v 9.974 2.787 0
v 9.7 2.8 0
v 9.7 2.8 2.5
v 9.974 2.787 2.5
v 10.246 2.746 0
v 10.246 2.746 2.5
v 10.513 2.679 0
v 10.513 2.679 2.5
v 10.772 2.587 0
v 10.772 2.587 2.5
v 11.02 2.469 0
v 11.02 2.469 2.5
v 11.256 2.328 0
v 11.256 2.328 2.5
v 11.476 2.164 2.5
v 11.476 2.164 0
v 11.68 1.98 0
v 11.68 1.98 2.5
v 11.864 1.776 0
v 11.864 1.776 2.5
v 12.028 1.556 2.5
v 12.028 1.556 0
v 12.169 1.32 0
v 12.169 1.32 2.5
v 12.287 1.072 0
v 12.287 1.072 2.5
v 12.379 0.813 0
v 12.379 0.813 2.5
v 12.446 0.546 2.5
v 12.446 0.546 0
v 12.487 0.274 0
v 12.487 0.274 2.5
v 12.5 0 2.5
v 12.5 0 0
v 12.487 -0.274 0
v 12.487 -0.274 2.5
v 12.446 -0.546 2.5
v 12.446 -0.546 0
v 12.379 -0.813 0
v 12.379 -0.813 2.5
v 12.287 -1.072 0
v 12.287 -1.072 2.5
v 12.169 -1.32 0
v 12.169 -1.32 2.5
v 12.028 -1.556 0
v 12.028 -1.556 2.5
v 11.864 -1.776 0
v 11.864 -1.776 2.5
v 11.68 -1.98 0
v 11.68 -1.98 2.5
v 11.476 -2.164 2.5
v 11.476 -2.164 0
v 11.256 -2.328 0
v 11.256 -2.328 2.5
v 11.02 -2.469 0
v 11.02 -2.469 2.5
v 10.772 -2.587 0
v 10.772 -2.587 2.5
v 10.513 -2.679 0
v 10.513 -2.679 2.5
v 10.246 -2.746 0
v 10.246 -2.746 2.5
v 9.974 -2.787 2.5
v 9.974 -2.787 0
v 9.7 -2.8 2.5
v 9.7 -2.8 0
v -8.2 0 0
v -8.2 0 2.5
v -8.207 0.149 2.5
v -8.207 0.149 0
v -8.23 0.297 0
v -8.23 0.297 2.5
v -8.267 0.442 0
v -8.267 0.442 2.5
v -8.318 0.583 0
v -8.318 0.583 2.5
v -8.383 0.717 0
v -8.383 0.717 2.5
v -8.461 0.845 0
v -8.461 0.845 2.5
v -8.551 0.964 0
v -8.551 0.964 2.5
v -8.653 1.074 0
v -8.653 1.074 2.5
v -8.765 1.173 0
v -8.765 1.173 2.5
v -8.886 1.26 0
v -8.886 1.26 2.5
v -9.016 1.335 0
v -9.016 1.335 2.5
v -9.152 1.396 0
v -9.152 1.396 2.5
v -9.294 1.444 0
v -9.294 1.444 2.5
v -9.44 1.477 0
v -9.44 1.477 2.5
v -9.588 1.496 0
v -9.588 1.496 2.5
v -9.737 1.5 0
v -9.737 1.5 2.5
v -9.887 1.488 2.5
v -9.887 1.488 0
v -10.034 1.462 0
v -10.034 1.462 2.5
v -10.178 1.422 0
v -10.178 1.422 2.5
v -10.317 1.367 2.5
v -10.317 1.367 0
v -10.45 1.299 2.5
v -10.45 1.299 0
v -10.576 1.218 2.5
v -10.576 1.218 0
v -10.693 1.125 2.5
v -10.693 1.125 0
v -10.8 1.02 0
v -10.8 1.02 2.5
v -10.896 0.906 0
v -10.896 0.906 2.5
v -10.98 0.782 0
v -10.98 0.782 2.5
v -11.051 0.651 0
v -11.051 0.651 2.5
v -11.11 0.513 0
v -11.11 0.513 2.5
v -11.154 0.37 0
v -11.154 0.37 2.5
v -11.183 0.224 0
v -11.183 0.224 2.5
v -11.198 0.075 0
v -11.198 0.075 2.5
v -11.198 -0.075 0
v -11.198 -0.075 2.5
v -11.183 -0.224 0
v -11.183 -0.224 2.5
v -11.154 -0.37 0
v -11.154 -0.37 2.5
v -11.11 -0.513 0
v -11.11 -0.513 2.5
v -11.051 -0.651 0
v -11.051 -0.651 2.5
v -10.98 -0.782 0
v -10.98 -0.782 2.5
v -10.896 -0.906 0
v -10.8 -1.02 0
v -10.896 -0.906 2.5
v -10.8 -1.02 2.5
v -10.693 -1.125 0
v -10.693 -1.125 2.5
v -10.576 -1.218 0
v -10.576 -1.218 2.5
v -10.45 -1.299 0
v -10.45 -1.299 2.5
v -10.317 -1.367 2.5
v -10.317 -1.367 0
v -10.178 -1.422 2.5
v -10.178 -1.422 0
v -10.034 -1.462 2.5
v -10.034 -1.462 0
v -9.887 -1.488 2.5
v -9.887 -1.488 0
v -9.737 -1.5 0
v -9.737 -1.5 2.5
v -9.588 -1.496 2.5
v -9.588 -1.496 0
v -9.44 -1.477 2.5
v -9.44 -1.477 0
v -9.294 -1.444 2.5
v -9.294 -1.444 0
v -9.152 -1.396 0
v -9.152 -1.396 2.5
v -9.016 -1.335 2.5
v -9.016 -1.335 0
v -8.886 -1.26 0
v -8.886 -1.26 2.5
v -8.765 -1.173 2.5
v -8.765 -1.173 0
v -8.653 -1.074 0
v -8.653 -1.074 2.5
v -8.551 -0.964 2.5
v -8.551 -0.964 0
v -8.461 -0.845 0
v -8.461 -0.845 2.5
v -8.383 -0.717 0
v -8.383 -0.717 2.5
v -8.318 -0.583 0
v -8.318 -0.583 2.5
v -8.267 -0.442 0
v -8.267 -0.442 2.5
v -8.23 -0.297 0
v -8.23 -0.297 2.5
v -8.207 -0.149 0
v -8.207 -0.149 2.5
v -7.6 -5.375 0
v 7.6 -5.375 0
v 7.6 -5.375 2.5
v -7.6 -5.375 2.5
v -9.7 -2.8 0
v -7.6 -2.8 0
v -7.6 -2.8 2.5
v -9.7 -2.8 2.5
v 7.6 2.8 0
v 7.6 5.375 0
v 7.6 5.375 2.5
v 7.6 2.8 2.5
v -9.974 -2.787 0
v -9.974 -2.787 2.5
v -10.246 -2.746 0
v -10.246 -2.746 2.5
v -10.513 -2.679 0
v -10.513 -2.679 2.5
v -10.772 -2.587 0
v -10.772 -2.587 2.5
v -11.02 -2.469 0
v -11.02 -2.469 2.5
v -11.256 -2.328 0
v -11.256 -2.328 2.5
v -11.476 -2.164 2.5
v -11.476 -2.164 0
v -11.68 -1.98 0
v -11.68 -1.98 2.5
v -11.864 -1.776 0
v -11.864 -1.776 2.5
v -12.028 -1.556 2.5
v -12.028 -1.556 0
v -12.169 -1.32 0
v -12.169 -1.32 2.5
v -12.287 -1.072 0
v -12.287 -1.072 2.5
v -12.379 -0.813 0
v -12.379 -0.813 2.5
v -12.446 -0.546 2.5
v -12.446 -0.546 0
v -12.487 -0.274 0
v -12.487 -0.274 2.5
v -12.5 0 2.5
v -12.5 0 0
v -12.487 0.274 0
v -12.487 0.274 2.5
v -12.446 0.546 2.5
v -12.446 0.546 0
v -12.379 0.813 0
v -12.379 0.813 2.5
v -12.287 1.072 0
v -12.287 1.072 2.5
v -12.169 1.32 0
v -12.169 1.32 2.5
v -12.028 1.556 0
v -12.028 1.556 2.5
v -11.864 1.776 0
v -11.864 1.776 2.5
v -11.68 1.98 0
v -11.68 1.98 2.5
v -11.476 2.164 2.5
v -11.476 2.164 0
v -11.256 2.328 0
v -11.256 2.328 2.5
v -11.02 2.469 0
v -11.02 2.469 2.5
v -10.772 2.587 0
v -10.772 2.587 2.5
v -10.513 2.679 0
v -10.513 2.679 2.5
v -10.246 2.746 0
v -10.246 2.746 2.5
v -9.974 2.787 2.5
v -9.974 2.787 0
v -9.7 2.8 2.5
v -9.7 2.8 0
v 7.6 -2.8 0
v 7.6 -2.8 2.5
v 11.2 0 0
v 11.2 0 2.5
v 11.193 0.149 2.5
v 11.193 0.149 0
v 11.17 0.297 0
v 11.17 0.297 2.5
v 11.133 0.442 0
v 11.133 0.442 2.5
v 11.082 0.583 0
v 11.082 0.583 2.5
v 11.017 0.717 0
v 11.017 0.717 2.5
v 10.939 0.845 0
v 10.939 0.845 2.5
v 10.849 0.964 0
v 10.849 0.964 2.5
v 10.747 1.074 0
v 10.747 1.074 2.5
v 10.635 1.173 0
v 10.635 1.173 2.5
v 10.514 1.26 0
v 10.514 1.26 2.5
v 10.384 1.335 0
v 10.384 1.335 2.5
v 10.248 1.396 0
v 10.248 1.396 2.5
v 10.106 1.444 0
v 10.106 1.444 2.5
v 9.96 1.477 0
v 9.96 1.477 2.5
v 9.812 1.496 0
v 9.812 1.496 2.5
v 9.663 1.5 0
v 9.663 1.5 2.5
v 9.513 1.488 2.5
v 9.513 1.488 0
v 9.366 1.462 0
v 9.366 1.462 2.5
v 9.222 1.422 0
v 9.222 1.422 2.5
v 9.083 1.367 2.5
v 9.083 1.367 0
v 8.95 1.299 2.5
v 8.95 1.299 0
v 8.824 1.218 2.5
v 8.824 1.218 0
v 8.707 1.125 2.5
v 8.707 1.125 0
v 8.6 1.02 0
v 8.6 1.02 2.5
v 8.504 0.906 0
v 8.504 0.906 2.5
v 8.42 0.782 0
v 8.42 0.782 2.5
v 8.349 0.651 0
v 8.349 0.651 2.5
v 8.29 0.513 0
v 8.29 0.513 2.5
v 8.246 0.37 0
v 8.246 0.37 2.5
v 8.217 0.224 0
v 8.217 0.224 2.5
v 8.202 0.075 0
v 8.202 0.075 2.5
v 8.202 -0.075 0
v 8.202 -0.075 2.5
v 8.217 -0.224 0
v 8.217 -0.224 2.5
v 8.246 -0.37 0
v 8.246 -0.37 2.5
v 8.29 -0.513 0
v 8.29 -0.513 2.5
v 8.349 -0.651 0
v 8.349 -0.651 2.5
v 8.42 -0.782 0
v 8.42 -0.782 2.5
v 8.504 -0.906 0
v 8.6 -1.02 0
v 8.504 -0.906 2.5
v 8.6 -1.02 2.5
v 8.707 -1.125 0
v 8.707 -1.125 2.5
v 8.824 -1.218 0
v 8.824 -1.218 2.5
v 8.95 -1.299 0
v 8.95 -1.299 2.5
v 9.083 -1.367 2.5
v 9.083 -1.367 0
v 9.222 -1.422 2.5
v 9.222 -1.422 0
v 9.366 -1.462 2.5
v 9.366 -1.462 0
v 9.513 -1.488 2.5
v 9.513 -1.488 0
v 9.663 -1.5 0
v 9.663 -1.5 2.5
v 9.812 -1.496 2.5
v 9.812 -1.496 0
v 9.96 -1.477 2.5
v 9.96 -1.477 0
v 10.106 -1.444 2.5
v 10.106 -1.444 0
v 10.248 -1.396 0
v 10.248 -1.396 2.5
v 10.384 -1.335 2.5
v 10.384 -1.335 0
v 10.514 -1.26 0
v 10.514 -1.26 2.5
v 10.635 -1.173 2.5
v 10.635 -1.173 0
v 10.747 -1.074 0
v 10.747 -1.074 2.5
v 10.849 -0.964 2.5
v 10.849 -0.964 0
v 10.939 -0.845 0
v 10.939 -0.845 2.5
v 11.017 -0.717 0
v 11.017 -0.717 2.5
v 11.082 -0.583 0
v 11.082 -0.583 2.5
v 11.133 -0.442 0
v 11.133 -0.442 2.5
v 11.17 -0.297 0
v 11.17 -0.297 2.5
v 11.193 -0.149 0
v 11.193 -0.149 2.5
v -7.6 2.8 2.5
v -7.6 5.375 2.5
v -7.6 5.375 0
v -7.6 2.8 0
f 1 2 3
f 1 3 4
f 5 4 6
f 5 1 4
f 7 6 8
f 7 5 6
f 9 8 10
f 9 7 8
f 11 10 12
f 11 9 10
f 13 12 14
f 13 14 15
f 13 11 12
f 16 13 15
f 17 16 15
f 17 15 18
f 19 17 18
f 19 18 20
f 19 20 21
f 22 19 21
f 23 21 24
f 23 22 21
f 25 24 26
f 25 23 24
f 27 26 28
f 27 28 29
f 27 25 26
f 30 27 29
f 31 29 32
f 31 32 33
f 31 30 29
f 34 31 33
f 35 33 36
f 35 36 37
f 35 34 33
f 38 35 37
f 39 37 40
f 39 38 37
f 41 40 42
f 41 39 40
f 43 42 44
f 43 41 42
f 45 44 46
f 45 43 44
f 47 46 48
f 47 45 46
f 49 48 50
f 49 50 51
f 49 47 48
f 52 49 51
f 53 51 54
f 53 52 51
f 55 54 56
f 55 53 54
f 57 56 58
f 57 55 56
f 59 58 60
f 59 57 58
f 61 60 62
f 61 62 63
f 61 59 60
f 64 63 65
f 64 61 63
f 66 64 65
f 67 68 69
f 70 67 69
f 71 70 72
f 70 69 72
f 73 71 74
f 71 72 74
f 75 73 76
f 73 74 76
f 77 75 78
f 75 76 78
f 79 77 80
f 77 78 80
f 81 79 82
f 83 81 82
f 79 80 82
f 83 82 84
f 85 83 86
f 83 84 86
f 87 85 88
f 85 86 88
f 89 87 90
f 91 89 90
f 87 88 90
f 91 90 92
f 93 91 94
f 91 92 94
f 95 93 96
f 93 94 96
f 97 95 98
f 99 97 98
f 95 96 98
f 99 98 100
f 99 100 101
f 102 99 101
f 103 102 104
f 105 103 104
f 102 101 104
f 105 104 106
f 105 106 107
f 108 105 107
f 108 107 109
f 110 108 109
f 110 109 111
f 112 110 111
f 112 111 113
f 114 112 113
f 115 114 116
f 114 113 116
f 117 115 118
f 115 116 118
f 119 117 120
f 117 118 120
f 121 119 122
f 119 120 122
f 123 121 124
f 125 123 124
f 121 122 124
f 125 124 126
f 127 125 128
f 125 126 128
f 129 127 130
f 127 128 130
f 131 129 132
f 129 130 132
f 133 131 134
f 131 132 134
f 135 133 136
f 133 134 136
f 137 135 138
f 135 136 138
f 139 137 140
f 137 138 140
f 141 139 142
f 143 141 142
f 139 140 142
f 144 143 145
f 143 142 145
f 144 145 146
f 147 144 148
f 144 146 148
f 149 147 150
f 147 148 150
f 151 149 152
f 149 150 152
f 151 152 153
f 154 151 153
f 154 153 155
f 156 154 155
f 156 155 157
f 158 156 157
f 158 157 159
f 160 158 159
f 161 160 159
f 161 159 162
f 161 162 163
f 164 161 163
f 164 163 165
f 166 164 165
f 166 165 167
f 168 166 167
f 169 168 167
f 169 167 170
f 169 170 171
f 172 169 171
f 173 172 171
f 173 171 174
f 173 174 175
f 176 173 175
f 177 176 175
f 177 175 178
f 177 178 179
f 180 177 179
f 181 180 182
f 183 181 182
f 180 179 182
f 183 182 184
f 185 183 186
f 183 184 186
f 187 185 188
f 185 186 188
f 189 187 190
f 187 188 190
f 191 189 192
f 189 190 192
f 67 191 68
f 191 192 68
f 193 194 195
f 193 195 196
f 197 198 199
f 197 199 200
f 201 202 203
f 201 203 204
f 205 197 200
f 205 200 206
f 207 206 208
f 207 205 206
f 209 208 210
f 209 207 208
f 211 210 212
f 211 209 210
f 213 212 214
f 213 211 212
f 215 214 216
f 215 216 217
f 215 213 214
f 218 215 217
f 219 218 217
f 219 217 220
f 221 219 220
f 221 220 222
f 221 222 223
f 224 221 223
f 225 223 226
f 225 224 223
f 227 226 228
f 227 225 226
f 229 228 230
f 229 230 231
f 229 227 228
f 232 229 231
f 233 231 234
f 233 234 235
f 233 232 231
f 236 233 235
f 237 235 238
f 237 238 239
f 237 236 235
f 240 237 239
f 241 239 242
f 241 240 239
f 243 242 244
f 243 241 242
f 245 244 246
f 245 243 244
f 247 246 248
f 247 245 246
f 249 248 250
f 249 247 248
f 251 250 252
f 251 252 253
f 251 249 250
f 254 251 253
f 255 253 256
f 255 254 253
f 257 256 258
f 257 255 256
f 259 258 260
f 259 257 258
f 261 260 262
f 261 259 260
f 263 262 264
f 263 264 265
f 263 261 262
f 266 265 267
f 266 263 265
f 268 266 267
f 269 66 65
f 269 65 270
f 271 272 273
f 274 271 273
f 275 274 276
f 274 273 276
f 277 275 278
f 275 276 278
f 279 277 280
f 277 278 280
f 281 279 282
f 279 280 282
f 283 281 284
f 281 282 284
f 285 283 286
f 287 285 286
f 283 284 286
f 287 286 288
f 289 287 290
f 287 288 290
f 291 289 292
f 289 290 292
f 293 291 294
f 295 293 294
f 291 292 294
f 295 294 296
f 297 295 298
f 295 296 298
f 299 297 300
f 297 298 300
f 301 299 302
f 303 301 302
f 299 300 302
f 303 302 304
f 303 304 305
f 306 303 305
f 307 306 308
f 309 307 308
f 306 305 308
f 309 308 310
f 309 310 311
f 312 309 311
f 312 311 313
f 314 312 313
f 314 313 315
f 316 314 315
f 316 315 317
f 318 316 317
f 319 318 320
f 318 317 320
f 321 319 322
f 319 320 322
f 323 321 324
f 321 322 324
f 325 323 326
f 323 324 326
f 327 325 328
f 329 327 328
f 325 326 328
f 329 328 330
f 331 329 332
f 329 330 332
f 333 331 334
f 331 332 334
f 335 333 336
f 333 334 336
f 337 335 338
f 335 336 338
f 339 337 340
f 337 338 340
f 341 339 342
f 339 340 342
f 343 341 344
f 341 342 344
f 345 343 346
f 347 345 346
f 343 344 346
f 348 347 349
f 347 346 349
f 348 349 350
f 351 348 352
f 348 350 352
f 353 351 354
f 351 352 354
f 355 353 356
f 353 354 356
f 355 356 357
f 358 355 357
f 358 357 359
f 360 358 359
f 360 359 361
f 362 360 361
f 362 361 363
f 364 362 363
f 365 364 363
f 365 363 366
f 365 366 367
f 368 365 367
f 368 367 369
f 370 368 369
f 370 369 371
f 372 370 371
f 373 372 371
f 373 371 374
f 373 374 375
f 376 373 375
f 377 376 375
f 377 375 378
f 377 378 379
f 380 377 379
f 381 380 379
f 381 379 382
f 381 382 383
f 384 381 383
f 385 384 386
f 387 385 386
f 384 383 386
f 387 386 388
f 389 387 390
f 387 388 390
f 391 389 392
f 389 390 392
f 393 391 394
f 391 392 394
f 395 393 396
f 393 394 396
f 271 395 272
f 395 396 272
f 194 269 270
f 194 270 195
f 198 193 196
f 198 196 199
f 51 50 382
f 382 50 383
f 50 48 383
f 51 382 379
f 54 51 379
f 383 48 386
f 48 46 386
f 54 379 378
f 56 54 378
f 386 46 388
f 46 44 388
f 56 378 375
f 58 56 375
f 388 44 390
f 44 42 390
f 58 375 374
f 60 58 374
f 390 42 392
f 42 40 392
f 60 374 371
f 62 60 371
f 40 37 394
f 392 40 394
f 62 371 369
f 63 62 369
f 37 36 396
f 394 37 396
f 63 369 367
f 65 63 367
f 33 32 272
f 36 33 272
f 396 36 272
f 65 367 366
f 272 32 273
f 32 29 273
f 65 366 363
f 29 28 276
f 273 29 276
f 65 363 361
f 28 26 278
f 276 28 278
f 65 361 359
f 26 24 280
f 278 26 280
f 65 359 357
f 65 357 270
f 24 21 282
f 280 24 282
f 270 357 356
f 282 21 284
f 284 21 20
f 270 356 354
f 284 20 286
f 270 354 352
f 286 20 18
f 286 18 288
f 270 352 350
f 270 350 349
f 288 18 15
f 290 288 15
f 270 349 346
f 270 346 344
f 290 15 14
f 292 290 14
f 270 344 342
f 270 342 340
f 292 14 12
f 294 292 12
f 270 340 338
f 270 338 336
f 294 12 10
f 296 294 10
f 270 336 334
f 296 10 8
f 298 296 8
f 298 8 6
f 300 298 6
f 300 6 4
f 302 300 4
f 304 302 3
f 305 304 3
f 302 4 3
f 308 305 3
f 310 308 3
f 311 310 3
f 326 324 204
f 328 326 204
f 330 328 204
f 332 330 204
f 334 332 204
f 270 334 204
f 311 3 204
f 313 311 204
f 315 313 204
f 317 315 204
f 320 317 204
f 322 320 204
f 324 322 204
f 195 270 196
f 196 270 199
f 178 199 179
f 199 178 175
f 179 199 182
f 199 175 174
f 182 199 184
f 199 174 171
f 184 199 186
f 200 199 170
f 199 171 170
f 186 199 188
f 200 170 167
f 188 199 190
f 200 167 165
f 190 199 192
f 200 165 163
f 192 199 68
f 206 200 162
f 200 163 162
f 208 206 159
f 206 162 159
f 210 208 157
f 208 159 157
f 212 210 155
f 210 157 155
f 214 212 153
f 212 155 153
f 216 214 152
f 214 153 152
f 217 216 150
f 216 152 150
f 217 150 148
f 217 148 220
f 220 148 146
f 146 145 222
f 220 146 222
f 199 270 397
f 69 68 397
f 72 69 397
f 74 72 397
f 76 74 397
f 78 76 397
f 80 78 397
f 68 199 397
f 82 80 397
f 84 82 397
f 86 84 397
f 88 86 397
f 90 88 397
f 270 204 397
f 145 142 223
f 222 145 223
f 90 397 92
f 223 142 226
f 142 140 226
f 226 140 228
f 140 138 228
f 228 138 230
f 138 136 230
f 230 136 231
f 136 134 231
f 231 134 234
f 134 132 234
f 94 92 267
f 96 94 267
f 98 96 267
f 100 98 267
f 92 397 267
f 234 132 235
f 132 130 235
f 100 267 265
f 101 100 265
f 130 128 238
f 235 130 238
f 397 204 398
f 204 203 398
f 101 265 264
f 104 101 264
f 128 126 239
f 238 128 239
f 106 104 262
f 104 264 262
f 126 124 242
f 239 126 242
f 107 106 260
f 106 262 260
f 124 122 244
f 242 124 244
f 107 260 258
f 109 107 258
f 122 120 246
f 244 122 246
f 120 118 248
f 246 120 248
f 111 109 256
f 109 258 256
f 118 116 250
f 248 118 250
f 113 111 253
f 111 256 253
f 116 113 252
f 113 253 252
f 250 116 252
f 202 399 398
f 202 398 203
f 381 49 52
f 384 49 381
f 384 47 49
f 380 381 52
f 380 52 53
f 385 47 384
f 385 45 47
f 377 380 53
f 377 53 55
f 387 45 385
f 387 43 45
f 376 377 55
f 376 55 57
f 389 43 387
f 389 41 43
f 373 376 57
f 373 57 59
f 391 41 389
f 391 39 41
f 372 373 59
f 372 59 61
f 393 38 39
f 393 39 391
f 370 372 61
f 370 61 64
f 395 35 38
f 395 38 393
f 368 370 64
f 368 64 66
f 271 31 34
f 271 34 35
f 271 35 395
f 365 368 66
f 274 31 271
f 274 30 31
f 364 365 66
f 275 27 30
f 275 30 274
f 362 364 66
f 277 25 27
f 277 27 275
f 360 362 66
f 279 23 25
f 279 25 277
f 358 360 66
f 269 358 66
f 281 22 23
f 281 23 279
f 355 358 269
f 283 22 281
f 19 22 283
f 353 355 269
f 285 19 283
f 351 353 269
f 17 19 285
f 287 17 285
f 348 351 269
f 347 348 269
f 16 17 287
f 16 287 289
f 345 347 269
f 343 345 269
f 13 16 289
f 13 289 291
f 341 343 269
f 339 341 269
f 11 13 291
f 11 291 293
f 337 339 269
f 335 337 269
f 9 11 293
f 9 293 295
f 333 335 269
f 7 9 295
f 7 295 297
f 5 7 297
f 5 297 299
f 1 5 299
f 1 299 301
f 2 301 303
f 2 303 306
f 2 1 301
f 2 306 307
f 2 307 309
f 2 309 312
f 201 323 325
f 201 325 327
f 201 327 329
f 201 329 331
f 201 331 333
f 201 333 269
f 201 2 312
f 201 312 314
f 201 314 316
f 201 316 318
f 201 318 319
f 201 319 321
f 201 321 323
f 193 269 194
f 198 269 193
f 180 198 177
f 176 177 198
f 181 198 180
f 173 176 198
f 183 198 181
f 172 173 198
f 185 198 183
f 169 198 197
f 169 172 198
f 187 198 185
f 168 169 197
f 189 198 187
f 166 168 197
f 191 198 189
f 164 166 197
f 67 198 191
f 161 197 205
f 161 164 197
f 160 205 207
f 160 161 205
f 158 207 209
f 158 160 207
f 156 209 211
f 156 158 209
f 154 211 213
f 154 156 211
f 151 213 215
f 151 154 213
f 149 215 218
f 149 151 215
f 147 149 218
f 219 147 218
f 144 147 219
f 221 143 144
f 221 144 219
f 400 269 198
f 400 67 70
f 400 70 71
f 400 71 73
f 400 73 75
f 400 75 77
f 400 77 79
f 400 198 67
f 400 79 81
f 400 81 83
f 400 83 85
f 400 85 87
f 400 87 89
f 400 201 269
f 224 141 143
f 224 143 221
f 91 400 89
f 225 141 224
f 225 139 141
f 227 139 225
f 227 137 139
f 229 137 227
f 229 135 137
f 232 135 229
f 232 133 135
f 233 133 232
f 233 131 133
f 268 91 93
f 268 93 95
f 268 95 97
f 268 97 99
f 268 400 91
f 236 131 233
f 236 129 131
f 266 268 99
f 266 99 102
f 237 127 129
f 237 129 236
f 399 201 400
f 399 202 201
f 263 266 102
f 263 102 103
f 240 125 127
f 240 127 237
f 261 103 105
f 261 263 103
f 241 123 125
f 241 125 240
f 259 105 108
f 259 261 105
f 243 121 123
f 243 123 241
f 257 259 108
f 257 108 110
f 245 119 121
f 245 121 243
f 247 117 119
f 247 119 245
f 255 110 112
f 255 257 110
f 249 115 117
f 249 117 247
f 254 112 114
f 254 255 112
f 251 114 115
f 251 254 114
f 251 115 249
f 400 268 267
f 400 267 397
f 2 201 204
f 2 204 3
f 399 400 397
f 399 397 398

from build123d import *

# Parameters (mm, degrees)
BOSS_EXTRUDE1_DEPTH = 2.5
SKETCH2_R           = 1.5
CUT_EXTRUDE1_DEPTH  = 2.5


with BuildPart() as part:
    # Sketch1 → Boss-Extrude1 (new body)
    with BuildSketch(Plane.XY):
        with BuildLine():
            Line((7.6, -2.8), (7.6, -5.375))
            Line((7.6, -5.375), (-7.6, -5.375))
            Line((-7.6, -5.375), (-7.6, -2.8))
            Line((-7.6, -2.8), (-9.7, -2.8))
            ThreePointArc((-9.7, -2.8), (-12.5, 0), (-9.7, 2.8))
            Line((-9.7, 2.8), (-7.6, 2.8))
            Line((-7.6, 2.8), (-7.6, 5.375))
            Line((-7.6, 5.375), (7.6, 5.375))
            Line((7.6, 5.375), (7.6, 2.8))
            Line((7.6, 2.8), (9.7, 2.8))
            ThreePointArc((9.7, 2.8), (12.5, 0), (9.7, -2.8))
            Line((9.7, -2.8), (7.6, -2.8))
        make_face()
    extrude(amount=BOSS_EXTRUDE1_DEPTH)

    # Sketch2 → Cut-Extrude1 (cut)
    with BuildSketch(Plane.XY.offset(2.5)):
        with Locations((-9.7, 0)):
            Circle(SKETCH2_R)
        with Locations((9.7, 0)):
            Circle(SKETCH2_R)
    extrude(amount=-CUT_EXTRUDE1_DEPTH, mode=Mode.SUBTRACT)


solid = part.part
